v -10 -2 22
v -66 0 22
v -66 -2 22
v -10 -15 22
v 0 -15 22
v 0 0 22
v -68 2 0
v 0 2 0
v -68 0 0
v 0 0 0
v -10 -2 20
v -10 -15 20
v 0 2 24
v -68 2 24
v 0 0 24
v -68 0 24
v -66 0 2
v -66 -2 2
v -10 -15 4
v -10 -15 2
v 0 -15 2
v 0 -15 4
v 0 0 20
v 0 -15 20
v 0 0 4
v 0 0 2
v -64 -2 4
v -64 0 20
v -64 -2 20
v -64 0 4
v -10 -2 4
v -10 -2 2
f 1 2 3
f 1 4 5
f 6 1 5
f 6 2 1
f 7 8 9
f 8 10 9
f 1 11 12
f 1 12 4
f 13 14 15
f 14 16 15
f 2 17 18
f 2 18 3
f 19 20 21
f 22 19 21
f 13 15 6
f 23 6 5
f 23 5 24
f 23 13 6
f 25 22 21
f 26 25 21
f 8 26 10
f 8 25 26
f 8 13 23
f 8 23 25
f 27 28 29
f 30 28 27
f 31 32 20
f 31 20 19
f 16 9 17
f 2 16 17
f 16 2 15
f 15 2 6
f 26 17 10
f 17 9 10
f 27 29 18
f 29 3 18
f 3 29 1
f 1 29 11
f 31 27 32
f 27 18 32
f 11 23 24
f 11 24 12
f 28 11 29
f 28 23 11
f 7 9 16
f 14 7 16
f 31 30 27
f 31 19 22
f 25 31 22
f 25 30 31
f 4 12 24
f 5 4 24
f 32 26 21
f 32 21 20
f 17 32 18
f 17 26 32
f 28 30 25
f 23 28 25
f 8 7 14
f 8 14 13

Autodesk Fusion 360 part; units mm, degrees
sketch "Sketch1" plane through (0, 0, 0) normal (0, 1, 0) x (1, 0, 0)
  line L0 (0, 0) -> (-68, 0)
  line L1 (-68, 0) -> (-68, -24)
  line L2 (-68, -24) -> (0, -24)
  line L3 (0, -24) -> (0, 0)
extrude "Extrude1" add sketch "Sketch1" along normal blind 2
sketch "Sketch2" plane through (0, 0, 0) normal (0, 1, 0) x (1, 0, 0)
  line L0 (-66, -22) -> (0, -22)
  line L1 (0, -22) -> (0, -20)
  line L2 (0, -20) -> (-66, -20)
  line L3 (-66, -20) -> (-66, -22)
extrude "Extrude2" add sketch "Sketch2" against normal blind 2
sketch "Sketch3" plane through (0, 0, 0) normal (0, 1, 0) x (1, 0, 0)
  line L0 (-66, -20) -> (-64, -20)
  line L1 (-64, -20) -> (-64, -2)
  line L2 (-64, -2) -> (-66, -2)
  line L3 (-66, -2) -> (-66, -20)
extrude "Extrude3" add sketch "Sketch3" against normal blind 2
sketch "Sketch4" plane through (0, 0, 0) normal (0, 1, 0) x (1, 0, 0)
  line L0 (-64, -4) -> (0, -4)
  line L1 (0, -4) -> (0, -2)
  line L2 (0, -2) -> (-64, -2)
  line L3 (-64, -2) -> (-64, -4)
extrude "Extrude4" add sketch "Sketch4" against normal blind 2
sketch "Sketch5" plane through (0, 0, 0) normal (0, 1, 0) x (1, 0, 0)
  line L0 (-10, -22) -> (0, -22)
  line L1 (0, -22) -> (0, -20)
  line L2 (0, -20) -> (-10, -20)
  line L3 (-10, -20) -> (-10, -22)
extrude "Extrude5" add sketch "Sketch5" against normal blind 10
extrude "Extrude6" add 1 faces at (-6.6667, -10, 20.6667) along direction (0, -1, 0) blind 5
sketch "Sketch6" plane through (0, 0, 0) normal (0, 1, 0) x (1, 0, 0)
  line L0 (-10, -4) -> (0, -4)
  line L1 (0, -4) -> (0, -2)
  line L2 (0, -2) -> (-10, -2)
  line L3 (-10, -2) -> (-10, -4)
extrude "Extrude7" add sketch "Sketch6" against normal blind 15
